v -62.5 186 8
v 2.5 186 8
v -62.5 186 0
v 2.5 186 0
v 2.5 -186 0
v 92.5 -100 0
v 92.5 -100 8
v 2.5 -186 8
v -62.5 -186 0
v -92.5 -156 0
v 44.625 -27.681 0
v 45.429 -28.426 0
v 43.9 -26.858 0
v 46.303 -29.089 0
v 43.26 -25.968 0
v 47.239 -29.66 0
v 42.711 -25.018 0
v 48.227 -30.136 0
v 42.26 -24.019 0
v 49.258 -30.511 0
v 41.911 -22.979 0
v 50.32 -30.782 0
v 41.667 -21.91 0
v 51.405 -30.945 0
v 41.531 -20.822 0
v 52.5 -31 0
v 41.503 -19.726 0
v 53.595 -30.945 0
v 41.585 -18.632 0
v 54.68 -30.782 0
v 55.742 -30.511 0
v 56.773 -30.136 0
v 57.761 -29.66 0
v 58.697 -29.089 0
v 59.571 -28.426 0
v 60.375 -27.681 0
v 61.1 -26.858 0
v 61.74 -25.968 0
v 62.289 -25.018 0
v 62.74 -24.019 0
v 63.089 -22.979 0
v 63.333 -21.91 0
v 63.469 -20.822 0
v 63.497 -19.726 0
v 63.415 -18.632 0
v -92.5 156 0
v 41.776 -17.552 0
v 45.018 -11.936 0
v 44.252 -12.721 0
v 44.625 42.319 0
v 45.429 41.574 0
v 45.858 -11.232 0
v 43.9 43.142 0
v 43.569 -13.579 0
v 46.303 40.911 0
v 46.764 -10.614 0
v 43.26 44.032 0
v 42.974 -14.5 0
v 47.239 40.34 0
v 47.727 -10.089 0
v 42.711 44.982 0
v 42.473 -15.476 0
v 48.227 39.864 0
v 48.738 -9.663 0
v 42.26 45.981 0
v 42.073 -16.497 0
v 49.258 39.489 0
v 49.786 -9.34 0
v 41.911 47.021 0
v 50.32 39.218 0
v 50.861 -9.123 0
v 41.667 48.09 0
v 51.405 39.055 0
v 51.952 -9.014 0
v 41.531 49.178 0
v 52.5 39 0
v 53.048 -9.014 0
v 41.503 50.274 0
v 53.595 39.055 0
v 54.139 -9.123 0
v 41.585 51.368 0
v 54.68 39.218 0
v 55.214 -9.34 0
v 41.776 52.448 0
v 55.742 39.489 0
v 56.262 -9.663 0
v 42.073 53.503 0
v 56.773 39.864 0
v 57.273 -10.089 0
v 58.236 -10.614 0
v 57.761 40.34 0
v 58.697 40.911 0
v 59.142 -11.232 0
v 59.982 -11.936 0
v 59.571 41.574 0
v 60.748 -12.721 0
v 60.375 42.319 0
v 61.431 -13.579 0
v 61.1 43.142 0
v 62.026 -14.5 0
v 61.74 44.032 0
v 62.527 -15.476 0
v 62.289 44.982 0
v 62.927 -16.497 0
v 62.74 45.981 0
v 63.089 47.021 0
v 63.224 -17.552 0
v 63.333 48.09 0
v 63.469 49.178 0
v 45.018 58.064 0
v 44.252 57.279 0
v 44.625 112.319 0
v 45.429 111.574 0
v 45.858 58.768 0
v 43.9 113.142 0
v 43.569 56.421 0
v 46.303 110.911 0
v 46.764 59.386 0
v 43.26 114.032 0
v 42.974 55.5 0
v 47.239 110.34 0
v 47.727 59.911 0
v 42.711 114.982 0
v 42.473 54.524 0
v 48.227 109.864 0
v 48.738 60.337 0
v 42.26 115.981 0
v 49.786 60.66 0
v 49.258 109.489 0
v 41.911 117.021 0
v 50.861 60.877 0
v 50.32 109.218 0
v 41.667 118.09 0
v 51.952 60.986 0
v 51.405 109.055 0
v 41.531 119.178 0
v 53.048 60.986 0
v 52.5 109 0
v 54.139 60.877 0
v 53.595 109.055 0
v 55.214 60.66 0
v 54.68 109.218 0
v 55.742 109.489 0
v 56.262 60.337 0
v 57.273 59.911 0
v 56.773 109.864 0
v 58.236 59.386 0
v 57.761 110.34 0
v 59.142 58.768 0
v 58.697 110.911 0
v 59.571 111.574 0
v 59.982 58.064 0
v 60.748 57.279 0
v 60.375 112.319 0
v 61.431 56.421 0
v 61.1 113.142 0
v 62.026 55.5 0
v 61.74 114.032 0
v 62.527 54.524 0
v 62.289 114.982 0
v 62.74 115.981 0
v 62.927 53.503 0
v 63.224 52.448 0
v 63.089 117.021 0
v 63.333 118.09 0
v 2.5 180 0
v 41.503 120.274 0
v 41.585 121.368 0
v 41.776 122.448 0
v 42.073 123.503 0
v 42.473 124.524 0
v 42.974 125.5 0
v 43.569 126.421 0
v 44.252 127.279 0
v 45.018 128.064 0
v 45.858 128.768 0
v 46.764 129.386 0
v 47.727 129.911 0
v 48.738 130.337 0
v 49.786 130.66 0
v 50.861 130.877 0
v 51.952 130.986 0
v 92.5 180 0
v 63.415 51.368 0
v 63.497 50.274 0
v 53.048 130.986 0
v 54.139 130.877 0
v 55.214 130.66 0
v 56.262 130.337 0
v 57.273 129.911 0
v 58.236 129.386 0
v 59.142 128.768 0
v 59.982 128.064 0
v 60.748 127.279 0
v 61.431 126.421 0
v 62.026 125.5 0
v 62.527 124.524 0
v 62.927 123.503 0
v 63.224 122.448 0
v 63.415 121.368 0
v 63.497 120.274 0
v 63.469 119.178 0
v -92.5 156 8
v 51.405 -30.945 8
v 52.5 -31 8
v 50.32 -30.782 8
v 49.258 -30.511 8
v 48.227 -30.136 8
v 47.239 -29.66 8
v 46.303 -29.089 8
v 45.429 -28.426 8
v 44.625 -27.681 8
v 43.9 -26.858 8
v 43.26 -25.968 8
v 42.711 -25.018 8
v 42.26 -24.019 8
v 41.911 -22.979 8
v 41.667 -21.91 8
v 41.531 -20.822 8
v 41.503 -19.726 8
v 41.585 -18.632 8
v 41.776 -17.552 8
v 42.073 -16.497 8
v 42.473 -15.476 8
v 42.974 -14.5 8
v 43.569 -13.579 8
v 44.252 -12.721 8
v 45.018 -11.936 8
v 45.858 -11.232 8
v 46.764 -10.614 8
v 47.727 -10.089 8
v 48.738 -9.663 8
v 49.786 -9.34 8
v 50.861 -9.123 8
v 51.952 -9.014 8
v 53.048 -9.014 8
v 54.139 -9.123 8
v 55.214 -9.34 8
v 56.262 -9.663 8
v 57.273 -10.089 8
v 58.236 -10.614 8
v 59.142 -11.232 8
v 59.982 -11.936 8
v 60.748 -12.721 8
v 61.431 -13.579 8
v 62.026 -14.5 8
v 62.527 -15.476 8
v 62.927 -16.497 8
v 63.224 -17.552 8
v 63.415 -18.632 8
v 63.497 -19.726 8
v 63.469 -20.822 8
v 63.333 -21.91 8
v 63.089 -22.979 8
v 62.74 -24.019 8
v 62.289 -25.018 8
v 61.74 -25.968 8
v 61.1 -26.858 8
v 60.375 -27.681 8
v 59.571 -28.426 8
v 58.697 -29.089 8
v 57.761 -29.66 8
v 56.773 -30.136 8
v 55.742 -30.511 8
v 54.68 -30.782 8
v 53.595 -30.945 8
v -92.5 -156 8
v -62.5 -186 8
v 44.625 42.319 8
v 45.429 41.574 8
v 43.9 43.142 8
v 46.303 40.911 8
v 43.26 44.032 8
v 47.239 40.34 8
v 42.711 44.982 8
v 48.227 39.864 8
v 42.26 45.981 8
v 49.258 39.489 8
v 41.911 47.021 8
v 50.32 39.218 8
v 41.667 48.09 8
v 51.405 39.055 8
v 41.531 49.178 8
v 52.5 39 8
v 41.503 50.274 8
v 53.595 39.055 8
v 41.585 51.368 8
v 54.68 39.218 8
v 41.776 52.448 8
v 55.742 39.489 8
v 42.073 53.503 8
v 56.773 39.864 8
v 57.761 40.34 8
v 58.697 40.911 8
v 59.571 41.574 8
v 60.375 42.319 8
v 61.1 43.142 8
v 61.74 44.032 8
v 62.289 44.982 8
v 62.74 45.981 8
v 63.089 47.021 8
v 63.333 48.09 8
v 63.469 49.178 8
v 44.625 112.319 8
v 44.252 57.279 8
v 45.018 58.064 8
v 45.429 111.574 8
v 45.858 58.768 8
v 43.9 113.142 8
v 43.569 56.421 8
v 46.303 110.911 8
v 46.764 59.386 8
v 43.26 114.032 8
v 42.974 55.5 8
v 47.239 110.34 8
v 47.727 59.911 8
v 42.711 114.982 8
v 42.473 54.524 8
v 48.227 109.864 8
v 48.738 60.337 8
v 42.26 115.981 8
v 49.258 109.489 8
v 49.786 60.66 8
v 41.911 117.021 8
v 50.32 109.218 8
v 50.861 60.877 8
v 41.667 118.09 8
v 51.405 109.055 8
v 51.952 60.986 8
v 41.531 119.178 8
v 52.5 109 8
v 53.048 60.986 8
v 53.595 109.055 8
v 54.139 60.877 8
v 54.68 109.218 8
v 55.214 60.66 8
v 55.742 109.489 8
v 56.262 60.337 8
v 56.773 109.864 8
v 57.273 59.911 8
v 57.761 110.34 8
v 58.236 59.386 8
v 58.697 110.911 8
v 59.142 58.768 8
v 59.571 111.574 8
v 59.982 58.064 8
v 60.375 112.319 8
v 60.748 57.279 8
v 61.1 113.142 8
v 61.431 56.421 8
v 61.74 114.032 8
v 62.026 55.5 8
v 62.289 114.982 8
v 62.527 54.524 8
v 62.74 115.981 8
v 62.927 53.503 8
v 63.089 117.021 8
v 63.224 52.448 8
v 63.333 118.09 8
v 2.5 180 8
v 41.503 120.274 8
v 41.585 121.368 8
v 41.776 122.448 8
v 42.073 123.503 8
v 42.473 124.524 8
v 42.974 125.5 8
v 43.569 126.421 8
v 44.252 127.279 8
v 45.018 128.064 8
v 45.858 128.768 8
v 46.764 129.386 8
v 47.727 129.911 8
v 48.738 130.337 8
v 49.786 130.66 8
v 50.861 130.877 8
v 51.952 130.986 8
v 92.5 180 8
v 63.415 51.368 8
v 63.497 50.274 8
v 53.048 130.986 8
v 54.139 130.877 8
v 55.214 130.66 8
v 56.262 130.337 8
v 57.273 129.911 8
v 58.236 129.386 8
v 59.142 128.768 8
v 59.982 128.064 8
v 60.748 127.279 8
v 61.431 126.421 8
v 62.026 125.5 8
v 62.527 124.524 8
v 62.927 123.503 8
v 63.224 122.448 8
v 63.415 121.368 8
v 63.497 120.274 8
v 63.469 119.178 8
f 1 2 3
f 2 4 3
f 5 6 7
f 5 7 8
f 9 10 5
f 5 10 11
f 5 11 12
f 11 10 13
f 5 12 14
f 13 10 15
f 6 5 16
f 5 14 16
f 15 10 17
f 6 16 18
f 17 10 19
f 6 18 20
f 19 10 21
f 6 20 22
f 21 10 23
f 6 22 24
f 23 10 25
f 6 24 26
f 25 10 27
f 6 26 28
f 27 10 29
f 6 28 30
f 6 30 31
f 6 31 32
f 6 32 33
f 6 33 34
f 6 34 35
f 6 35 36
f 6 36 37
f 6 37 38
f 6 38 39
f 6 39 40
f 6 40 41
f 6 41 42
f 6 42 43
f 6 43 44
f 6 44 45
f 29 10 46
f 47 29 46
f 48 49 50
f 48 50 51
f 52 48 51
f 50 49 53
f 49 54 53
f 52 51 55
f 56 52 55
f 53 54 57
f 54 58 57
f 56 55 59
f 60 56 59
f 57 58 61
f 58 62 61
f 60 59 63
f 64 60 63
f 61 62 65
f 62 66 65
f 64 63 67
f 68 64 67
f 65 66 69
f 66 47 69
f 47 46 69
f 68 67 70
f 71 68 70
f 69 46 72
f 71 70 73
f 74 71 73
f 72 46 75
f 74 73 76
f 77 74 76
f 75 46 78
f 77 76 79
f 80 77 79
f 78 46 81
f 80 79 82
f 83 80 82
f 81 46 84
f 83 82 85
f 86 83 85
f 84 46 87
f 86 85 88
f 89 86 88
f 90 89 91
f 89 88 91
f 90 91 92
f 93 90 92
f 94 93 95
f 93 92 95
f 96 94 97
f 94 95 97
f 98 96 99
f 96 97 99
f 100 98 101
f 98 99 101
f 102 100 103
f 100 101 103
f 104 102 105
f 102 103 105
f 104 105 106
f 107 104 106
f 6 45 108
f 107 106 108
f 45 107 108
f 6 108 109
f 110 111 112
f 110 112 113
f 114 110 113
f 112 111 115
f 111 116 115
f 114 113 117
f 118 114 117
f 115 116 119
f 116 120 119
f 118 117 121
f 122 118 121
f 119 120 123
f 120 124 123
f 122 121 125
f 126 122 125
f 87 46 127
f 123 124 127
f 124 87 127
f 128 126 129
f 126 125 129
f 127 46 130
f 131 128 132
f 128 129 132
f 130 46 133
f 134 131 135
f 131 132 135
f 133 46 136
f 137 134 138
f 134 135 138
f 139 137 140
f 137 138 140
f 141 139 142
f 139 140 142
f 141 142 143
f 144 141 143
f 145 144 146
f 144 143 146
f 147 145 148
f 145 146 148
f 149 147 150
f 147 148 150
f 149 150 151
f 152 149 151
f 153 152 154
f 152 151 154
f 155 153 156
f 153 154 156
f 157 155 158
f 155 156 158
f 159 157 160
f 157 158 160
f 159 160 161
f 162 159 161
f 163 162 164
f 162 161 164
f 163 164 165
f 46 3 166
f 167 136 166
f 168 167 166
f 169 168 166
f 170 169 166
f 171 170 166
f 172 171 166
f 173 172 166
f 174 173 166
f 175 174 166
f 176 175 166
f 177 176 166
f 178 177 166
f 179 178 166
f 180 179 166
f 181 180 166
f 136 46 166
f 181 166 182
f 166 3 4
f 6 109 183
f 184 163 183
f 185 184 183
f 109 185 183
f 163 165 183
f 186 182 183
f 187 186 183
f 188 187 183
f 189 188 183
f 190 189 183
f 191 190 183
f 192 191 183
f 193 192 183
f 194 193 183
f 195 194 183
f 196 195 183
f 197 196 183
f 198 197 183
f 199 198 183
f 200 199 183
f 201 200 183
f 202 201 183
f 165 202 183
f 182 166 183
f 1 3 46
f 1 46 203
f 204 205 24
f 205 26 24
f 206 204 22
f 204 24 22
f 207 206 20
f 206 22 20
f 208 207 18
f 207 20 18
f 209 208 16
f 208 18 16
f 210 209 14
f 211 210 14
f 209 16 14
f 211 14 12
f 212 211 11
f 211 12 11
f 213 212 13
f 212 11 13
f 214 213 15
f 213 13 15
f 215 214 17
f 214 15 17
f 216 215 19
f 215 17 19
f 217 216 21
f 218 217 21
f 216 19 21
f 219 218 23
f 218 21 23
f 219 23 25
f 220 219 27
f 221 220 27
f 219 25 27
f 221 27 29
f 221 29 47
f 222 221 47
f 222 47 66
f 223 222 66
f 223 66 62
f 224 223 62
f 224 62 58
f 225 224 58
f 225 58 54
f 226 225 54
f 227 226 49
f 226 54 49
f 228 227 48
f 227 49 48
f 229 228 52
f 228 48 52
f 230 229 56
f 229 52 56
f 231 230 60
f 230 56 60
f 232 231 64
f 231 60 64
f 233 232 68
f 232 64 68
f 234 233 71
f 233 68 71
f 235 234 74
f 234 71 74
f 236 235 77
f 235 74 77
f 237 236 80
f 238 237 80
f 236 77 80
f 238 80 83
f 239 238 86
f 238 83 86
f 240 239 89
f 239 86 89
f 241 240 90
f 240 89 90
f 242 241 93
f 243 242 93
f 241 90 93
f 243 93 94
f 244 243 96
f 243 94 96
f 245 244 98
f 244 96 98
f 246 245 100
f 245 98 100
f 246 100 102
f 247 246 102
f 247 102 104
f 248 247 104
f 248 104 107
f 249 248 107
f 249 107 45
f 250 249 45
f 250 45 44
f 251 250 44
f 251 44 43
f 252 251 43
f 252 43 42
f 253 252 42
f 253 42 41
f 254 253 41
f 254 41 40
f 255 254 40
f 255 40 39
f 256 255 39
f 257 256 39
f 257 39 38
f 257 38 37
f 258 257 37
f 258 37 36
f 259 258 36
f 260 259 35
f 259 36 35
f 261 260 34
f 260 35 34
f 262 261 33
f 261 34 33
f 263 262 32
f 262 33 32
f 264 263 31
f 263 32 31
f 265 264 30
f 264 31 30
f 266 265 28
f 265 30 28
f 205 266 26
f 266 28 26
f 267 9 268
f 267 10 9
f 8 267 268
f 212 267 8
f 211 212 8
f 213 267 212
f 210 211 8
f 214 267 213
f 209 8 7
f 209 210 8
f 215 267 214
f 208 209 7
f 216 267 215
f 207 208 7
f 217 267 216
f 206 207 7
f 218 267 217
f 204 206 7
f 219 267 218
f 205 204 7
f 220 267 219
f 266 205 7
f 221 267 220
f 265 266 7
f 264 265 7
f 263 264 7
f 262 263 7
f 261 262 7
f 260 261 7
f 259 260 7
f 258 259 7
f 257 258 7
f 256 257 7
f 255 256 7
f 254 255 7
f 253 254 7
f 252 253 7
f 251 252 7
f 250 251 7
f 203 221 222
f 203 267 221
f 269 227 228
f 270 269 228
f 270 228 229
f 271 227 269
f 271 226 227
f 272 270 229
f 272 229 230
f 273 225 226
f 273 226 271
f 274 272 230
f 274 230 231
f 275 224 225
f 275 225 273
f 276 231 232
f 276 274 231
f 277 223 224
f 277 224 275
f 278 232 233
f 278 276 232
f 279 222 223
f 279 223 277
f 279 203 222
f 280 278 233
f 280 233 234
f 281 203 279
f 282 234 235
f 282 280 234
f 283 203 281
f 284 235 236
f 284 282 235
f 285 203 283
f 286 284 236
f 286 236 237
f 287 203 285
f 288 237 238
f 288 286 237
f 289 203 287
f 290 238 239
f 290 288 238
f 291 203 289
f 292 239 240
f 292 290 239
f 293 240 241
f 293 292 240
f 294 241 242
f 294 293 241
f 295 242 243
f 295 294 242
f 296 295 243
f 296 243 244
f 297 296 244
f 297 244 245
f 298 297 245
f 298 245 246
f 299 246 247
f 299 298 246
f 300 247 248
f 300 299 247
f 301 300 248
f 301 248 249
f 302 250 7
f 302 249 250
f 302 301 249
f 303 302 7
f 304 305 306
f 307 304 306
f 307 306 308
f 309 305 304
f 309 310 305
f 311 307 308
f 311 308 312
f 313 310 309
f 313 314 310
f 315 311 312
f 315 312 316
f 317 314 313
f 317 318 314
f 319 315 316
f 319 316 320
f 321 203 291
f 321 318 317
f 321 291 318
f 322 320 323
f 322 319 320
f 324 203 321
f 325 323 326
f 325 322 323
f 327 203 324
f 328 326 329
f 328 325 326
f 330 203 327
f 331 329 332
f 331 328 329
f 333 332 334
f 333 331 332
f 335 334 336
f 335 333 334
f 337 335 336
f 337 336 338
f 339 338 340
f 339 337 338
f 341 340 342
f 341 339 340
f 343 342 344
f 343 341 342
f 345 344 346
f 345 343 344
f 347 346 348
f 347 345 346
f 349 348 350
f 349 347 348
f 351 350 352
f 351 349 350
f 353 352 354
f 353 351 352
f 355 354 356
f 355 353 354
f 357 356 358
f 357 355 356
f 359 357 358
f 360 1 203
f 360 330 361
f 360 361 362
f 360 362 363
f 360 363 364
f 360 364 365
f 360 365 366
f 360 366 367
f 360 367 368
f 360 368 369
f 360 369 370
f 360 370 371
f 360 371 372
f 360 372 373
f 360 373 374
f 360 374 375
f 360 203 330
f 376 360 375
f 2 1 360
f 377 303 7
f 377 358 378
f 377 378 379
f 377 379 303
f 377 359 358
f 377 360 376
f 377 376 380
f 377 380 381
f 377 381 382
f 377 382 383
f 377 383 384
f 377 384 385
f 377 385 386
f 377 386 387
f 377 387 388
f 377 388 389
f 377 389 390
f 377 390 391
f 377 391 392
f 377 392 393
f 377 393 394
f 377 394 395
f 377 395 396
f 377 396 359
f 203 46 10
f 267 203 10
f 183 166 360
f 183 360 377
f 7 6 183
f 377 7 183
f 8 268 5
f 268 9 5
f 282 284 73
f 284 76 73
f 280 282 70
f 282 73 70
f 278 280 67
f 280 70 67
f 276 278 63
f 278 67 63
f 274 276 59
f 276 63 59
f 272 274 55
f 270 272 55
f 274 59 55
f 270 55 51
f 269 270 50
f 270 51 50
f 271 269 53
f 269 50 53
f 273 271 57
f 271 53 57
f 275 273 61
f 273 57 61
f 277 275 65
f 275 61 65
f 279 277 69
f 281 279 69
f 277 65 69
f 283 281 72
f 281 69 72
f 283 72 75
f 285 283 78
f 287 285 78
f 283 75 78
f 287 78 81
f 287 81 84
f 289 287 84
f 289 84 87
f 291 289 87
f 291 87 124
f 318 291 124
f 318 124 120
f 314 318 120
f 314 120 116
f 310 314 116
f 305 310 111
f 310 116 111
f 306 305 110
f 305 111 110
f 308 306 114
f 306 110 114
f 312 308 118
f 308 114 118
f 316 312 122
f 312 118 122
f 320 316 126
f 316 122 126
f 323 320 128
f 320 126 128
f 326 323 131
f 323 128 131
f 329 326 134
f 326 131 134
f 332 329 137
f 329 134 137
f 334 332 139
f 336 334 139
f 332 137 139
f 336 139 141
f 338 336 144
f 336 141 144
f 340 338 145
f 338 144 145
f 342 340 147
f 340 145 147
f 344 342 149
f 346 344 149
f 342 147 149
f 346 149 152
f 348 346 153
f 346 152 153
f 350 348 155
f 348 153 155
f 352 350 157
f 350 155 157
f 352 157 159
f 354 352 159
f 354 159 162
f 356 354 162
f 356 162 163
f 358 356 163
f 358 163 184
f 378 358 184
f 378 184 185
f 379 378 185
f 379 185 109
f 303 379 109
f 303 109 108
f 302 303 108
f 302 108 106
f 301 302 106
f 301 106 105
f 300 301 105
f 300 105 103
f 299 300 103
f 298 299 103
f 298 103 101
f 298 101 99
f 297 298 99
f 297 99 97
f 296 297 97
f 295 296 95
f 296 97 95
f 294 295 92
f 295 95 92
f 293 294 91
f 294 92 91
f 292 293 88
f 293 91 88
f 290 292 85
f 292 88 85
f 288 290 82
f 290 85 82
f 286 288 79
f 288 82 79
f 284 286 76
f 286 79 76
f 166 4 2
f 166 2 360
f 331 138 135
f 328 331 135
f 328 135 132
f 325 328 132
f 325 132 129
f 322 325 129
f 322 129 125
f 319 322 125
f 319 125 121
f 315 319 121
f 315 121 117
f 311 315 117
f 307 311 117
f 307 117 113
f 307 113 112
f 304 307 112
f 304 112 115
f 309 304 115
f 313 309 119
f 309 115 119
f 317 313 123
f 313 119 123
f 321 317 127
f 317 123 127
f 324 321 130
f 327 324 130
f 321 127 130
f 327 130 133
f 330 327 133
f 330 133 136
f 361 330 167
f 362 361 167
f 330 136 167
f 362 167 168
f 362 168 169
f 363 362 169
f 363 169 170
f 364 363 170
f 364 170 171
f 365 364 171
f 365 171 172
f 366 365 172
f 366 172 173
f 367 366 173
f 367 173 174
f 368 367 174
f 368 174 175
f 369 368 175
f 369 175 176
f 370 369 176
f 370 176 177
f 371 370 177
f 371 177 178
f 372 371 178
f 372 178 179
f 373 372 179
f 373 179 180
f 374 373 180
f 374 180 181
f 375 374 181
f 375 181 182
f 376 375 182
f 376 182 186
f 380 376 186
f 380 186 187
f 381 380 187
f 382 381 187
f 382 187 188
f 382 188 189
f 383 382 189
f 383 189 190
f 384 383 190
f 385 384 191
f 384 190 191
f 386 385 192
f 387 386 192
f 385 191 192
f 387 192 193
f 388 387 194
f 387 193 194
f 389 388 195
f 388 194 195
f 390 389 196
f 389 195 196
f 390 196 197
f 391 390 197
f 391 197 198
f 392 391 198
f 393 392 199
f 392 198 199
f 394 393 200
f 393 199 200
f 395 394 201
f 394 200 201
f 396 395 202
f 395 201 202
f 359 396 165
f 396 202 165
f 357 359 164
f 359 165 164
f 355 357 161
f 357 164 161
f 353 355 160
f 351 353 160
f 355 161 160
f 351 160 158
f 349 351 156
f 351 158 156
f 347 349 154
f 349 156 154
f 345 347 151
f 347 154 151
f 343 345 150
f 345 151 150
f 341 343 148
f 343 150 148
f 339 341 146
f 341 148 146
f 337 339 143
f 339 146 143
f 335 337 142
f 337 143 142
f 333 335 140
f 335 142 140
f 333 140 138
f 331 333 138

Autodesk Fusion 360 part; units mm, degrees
sketch "スケッチ1" plane through (0, 0, 0) normal (0, 0, 1) x (1, 0, 0)
  line L0 (2.5, 186) -> (-92.5, 186)
  line L1 (-92.5, 186) -> (-92.5, -186)
  line L2 (-92.5, -186) -> (2.5, -186)
  line L3 (92.5, -100) -> (92.5, 180)
  line L4 (89.5161, 180) -> (-92.5, -186) construction
  line L5 (-92.5, 186) -> (63.5083, -127.7032) construction
  line L6 (2.5, 186) -> (2.5, 180)
  line L7 (2.5, 180) -> (92.5, 180)
  line L8 (-92.5, -186) -> (2.5, -186) construction
  line L9 (92.5, -100) -> (2.5, -186)
  dimension "d2" = 372
  dimension "d5" = 95
extrude "押し出し1" add sketch "スケッチ1" along normal blind 8
chamfer "面取り1" distance 30 angle 45 2 edges at (-92.5, -186, 4) (-92.5, 186, 4)
sketch "スケッチ2" plane through (0, 0, 8) normal (0, 0, 1) x (-1, 0, 0)
  line L0 (62.5, -186) -> (92.5, -156)
  line L1 (92.5, -156) -> (92.5, 156)
  line L2 (92.5, 156) -> (62.5, 186)
  line L3 (62.5, 186) -> (-2.5, 186)
  line L4 (-2.5, 186) -> (-92.5, 100)
  line L5 (-92.5, 100) -> (-92.5, -180)
  line L6 (-92.5, -180) -> (-2.5, -180)
  line L7 (-2.5, -180) -> (-2.5, -186)
  line L8 (-2.5, -186) -> (62.5, -186)
  line L9 (-92.5, -180) -> (-52.5, -180) construction
  line L10 (-52.5, -180) -> (-52.5, -120) construction
  line L11 (-52.5, -120) -> (-92.5, -120) construction
  line L12 (-92.5, -120) -> (-92.5, -180) construction
  line L13 (-52.5, -120) -> (-52.5, -50) construction
  line L14 (-52.5, -50) -> (-52.5, 20) construction
  point P0 (-52.5, -120)
  point P1 (-52.5, -50)
  point P2 (-52.5, 20)
  dimension "d10" = 40
  dimension "d11" = 60
  dimension "d12" = 70
  dimension "d13" = 70
hole "穴1" at (52.5, 120, 8) at (52.5, 50, 8) at (52.5, -20, 8) direction (0, 0, -1) diameter 22 end through all
equation "d5 = 30 mm + 65 mm"
